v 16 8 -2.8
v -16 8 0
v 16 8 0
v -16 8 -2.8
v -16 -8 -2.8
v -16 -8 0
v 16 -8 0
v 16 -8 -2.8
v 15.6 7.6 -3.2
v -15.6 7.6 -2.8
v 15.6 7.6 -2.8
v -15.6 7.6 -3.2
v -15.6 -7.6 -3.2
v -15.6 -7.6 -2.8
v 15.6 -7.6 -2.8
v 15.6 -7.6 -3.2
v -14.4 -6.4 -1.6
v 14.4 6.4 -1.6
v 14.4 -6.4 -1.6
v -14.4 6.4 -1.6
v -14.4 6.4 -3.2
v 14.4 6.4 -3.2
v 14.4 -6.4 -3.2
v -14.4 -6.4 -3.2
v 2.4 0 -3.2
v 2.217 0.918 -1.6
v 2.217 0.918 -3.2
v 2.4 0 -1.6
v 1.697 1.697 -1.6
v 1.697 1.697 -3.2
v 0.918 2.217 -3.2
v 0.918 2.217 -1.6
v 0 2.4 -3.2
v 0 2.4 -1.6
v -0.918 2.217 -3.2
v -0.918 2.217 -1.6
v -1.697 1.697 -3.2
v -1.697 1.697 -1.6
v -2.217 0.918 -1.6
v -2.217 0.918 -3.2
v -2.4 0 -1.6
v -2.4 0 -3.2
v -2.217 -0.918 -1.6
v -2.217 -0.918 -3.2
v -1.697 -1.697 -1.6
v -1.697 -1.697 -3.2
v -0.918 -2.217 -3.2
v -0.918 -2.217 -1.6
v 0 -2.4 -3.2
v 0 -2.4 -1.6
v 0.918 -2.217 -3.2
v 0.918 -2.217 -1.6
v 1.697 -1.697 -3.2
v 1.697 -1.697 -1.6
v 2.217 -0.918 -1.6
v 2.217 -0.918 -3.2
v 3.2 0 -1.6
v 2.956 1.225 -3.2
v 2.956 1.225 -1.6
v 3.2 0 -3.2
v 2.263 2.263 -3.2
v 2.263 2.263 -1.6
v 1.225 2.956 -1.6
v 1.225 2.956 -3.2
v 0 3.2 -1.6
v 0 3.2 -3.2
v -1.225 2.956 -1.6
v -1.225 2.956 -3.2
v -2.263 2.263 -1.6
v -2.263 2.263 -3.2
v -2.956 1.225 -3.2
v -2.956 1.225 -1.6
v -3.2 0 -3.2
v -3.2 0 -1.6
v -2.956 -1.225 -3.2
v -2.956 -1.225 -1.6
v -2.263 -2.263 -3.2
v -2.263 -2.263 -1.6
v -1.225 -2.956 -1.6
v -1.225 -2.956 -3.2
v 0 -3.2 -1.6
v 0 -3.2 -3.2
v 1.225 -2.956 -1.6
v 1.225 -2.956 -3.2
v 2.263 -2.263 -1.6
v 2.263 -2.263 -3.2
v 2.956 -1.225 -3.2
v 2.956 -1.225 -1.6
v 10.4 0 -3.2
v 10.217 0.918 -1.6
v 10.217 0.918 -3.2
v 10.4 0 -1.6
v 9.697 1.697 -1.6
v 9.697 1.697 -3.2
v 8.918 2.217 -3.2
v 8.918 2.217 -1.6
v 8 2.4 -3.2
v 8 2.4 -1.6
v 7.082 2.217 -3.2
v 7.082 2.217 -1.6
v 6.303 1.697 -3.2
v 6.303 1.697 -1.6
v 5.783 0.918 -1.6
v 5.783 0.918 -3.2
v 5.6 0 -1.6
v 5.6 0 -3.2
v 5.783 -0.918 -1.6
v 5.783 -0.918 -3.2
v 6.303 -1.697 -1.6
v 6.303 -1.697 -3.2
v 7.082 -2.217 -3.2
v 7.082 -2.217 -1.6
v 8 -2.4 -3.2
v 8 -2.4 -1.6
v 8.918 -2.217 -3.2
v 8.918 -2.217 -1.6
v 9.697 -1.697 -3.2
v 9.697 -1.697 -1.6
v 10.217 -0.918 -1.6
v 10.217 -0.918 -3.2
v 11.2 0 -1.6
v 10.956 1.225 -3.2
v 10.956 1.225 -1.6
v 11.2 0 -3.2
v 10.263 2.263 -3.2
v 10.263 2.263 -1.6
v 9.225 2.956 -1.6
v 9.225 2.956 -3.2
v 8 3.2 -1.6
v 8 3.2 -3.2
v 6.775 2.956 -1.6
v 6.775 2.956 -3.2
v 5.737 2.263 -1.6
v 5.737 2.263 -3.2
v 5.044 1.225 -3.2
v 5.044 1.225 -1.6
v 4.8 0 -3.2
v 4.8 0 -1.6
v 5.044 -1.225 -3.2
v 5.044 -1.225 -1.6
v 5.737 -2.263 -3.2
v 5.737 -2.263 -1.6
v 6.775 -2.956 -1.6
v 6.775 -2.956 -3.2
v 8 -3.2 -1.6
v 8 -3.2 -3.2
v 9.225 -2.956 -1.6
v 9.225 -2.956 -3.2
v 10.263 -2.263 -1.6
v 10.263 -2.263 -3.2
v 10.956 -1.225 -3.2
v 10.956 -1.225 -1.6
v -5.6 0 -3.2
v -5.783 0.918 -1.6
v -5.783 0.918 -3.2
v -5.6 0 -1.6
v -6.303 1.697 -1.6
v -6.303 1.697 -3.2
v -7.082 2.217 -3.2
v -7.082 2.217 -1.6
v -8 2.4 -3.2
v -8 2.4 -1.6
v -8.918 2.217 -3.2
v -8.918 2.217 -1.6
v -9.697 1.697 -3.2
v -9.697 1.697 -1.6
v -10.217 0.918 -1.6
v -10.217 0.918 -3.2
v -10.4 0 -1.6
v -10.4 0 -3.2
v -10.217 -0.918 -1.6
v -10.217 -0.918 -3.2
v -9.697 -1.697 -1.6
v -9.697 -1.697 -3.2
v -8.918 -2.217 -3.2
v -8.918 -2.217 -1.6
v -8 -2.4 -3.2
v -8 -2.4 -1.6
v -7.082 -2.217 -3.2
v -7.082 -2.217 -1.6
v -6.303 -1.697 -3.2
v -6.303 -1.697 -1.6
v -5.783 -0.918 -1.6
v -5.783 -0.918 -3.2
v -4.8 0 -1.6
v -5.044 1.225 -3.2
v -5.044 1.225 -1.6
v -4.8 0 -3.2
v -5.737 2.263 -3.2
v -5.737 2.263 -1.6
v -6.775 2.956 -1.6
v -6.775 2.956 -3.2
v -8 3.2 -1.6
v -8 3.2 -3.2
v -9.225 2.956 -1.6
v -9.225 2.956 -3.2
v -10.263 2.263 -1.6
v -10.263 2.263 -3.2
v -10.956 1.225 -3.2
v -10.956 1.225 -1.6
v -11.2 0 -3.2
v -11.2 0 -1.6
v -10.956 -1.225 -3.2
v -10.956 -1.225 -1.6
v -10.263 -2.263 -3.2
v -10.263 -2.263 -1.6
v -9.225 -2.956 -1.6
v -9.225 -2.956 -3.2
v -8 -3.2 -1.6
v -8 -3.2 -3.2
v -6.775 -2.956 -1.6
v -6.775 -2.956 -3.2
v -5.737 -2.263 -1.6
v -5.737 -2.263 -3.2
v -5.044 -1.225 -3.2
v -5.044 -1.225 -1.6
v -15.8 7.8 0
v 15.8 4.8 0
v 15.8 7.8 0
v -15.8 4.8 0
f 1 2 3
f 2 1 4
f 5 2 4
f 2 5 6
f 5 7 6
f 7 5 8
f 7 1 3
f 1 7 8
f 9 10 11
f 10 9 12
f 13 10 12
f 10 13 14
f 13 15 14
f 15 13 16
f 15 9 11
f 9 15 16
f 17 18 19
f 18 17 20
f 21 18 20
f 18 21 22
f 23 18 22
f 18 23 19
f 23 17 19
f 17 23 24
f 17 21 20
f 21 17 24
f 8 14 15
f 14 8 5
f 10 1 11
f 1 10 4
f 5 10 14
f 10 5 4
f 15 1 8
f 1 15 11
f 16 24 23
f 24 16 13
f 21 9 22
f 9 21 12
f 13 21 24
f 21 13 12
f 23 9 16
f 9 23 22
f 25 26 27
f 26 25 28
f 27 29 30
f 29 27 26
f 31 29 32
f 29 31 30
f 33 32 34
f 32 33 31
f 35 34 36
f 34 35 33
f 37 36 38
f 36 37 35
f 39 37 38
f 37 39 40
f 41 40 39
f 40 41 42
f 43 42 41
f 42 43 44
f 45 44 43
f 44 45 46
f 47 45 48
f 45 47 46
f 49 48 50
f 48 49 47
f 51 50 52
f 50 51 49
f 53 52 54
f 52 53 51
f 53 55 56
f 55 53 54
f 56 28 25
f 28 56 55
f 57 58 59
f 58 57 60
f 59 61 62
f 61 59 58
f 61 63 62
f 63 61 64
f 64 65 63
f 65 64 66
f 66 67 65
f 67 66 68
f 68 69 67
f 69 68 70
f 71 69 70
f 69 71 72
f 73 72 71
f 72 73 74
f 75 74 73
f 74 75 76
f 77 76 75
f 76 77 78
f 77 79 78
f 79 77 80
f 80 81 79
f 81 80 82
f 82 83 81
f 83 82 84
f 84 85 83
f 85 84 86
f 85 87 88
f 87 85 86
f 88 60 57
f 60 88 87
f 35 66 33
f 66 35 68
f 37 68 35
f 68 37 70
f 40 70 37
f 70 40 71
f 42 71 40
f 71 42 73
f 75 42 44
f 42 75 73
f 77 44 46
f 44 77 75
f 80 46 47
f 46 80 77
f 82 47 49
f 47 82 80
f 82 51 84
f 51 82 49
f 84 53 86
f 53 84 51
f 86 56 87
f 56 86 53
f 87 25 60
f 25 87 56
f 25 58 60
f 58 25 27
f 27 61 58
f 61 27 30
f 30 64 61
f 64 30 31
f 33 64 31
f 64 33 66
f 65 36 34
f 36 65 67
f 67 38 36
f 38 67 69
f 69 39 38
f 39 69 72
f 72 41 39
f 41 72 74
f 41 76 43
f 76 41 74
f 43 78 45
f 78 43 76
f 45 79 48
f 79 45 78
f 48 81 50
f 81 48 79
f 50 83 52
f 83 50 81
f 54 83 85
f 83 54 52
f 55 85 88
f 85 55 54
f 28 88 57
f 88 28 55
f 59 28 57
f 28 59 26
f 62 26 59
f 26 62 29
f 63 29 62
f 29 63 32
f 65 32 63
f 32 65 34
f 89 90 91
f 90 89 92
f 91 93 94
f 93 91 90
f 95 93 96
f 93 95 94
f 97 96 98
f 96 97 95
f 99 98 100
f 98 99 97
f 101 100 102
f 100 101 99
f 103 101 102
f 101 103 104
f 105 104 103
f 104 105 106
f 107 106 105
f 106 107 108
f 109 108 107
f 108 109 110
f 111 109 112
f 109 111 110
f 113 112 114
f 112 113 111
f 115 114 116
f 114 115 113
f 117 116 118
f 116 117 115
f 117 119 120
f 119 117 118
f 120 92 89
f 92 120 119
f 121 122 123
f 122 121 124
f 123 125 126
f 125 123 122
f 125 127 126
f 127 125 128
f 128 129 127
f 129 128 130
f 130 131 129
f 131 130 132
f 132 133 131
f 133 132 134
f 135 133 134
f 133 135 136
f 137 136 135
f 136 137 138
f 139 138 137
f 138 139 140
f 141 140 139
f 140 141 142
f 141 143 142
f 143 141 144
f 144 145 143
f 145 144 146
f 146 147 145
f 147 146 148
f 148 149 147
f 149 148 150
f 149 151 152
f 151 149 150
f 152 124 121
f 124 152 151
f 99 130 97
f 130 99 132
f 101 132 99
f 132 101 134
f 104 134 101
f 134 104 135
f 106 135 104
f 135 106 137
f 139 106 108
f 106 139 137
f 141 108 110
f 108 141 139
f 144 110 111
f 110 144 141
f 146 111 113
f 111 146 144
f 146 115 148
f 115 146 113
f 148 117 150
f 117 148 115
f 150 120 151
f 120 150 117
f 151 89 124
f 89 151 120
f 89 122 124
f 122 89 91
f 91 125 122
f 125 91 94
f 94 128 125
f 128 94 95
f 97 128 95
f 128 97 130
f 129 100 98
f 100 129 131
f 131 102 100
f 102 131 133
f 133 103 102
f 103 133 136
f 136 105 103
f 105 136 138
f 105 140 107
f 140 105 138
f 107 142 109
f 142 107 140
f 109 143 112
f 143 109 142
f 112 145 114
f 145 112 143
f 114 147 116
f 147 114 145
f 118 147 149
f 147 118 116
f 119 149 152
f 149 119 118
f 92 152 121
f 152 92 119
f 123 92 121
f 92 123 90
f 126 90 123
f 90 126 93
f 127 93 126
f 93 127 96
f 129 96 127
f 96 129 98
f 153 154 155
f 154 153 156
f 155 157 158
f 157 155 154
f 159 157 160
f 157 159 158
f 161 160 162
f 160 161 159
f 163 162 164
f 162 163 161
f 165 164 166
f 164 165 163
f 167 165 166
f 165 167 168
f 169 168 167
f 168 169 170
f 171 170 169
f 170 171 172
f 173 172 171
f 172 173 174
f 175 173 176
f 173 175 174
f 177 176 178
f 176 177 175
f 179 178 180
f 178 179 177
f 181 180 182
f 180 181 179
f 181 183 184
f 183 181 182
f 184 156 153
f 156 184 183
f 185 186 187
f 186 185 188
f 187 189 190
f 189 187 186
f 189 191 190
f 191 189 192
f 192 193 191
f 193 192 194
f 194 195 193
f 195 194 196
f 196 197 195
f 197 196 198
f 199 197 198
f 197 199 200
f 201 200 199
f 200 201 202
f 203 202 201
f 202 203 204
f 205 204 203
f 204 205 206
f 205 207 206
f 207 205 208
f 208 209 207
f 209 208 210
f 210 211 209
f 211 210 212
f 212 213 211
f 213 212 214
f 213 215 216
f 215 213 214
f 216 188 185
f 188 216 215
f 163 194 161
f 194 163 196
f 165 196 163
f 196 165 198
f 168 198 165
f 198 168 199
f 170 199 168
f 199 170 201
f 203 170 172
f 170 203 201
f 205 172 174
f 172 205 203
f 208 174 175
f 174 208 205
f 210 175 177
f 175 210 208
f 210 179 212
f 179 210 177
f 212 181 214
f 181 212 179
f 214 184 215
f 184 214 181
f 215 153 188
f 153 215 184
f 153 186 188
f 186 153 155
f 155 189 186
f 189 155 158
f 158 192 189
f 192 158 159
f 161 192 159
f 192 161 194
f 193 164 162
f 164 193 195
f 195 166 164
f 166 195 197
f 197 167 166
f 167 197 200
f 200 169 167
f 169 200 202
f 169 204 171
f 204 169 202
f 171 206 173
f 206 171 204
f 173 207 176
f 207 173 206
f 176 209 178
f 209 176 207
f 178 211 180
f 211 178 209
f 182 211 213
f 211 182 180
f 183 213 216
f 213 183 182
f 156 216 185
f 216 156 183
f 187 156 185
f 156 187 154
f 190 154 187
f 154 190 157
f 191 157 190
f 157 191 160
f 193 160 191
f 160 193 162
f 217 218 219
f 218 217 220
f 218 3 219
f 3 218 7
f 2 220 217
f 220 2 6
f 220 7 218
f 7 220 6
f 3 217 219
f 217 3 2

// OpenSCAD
// file: ../p/4-4ring3.scad
use <../lib.scad>
$fa=1; $fs=0.2;
function ldraw_lib__4_4ring3(realsolid=false) = [
// 0 Ring  3 x 1.0
// 0 Name: 4-4ring3.dat
// 0 Author: James Jessiman
// 0 !LDRAW_ORG Primitive UPDATE 2009-01
// 0 !LICENSE Licensed under CC BY 2.0 and CC BY 4.0 : see CAreadme.txt
// 
// 0 BFC CERTIFY CCW
  [0,"BFC","CERTIFY"],
  [0,"BFC","CCW"],
// 
// 0 !HISTORY 1998-12-15 [PTadmin] Official Update 1998-10
// 0 !HISTORY 2002-04-05 [hafhead] Added BFC statement
// 0 !HISTORY 2002-04-25 [PTadmin] Official Update 2002-02
// 0 !HISTORY 2007-06-24 [PTadmin] Header formatted for Contributor Agreement
// 0 !HISTORY 2008-07-01 [PTadmin] Official Update 2008-01
// 0 !HISTORY 2008-08-26 [cwdee] Switch polygon winding and rename
// 0 !HISTORY 2009-05-02 [PTadmin] Official Update 2009-01
// 
// 
// 4 16 -1.5308 0 3.6956 -1.1481 0 2.7717 0 0 3 0 0 4
  [4,16,-1.5308,0,3.6956,-1.1481,0,2.7717,0,0,3,0,0,4],
// 4 16 -2.8284 0 2.8284 -2.1213 0 2.1213 -1.1481 0 2.7717 -1.5308 0 3.6956
  [4,16,-2.8284,0,2.8284,-2.1213,0,2.1213,-1.1481,0,2.7717,-1.5308,0,3.6956],
// 4 16 -3.6956 0 1.5308 -2.7717 0 1.1481 -2.1213 0 2.1213 -2.8284 0 2.8284
  [4,16,-3.6956,0,1.5308,-2.7717,0,1.1481,-2.1213,0,2.1213,-2.8284,0,2.8284],
// 4 16 -4 0 0 -3 0 0 -2.7717 0 1.1481 -3.6956 0 1.5308
  [4,16,-4,0,0,-3,0,0,-2.7717,0,1.1481,-3.6956,0,1.5308],
// 4 16 -3.6956 0 -1.5308 -2.7717 0 -1.1481 -3 0 0 -4 0 0
  [4,16,-3.6956,0,-1.5308,-2.7717,0,-1.1481,-3,0,0,-4,0,0],
// 4 16 -2.8284 0 -2.8284 -2.1213 0 -2.1213 -2.7717 0 -1.1481 -3.6956 0 -1.5308
  [4,16,-2.8284,0,-2.8284,-2.1213,0,-2.1213,-2.7717,0,-1.1481,-3.6956,0,-1.5308],
// 4 16 -1.5308 0 -3.6956 -1.1481 0 -2.7717 -2.1213 0 -2.1213 -2.8284 0 -2.8284
  [4,16,-1.5308,0,-3.6956,-1.1481,0,-2.7717,-2.1213,0,-2.1213,-2.8284,0,-2.8284],
// 4 16 0 0 -4 0 0 -3 -1.1481 0 -2.7717 -1.5308 0 -3.6956
  [4,16,0,0,-4,0,0,-3,-1.1481,0,-2.7717,-1.5308,0,-3.6956],
// 4 16 1.5308 0 -3.6956 1.1481 0 -2.7717 0 0 -3 0 0 -4
  [4,16,1.5308,0,-3.6956,1.1481,0,-2.7717,0,0,-3,0,0,-4],
// 4 16 2.8284 0 -2.8284 2.1213 0 -2.1213 1.1481 0 -2.7717 1.5308 0 -3.6956
  [4,16,2.8284,0,-2.8284,2.1213,0,-2.1213,1.1481,0,-2.7717,1.5308,0,-3.6956],
// 4 16 3.6956 0 -1.5308 2.7717 0 -1.1481 2.1213 0 -2.1213 2.8284 0 -2.8284
  [4,16,3.6956,0,-1.5308,2.7717,0,-1.1481,2.1213,0,-2.1213,2.8284,0,-2.8284],
// 4 16 4 0 0 3 0 0 2.7717 0 -1.1481 3.6956 0 -1.5308
  [4,16,4,0,0,3,0,0,2.7717,0,-1.1481,3.6956,0,-1.5308],
// 4 16 3.6956 0 1.5308 2.7717 0 1.1481 3 0 0 4 0 0
  [4,16,3.6956,0,1.5308,2.7717,0,1.1481,3,0,0,4,0,0],
// 4 16 2.8284 0 2.8284 2.1213 0 2.1213 2.7717 0 1.1481 3.6956 0 1.5308
  [4,16,2.8284,0,2.8284,2.1213,0,2.1213,2.7717,0,1.1481,3.6956,0,1.5308],
// 4 16 1.5308 0 3.6956 1.1481 0 2.7717 2.1213 0 2.1213 2.8284 0 2.8284
  [4,16,1.5308,0,3.6956,1.1481,0,2.7717,2.1213,0,2.1213,2.8284,0,2.8284],
// 4 16 0 0 4 0 0 3 1.1481 0 2.7717 1.5308 0 3.6956
  [4,16,0,0,4,0,0,3,1.1481,0,2.7717,1.5308,0,3.6956],
// 0
];
module ldraw_lib__4_4ring3(step=0, col=false, unit=2/5, alt=false, line=0.2, solid=!$preview)
    makepoly(ldraw_lib__4_4ring3(solid), step=step, col=col, unit=unit, alt=alt, line=line, solid=solid);
ldraw_lib__4_4ring3(line=0.2);
// file: ../p/4-4edge.scad
use <../lib.scad>
function ldraw_lib__4_4edge() = [
// 0 Circle 1.0
// 0 Name: 4-4edge.dat
// 0 Author: James Jessiman
// 0 !LDRAW_ORG Primitive UPDATE 2017-01
// 0 !LICENSE Licensed under CC BY 2.0 and CC BY 4.0 : see CAreadme.txt
// 
// 0 BFC CERTIFY CCW
  [0,"BFC","CERTIFY"],
  [0,"BFC","CCW"],
// 
// 0 !HISTORY 1998-12-15 [PTadmin] Official Update 1998-10
// 0 !HISTORY 2005-12-28 [PTadmin] Official Update 2005-01
// 0 !HISTORY 2007-06-24 [PTadmin] Header formatted for Contributor Agreement
// 0 !HISTORY 2008-07-01 [PTadmin] Official Update 2008-01
// 0 !HISTORY 2017-01-15 [Steffen] BFCed
// 0 !HISTORY 2017-12-30 [PTadmin] Official Update 2017-01
// 
// 
// 2 24 1 0 0 0.9239 0 0.3827
  [2,24,1,0,0,0.9239,0,0.3827],
// 2 24 0.9239 0 0.3827 0.7071 0 0.7071
  [2,24,0.9239,0,0.3827,0.7071,0,0.7071],
// 2 24 0.7071 0 0.7071 0.3827 0 0.9239
  [2,24,0.7071,0,0.7071,0.3827,0,0.9239],
// 2 24 0.3827 0 0.9239 0 0 1
  [2,24,0.3827,0,0.9239,0,0,1],
// 2 24 0 0 1 -0.3827 0 0.9239
  [2,24,0,0,1,-0.3827,0,0.9239],
// 2 24 -0.3827 0 0.9239 -0.7071 0 0.7071
  [2,24,-0.3827,0,0.9239,-0.7071,0,0.7071],
// 2 24 -0.7071 0 0.7071 -0.9239 0 0.3827
  [2,24,-0.7071,0,0.7071,-0.9239,0,0.3827],
// 2 24 -0.9239 0 0.3827 -1 0 -0
  [2,24,-0.9239,0,0.3827,-1,0,-0],
// 2 24 -1 0 -0 -0.9239 0 -0.3827
  [2,24,-1,0,-0,-0.9239,0,-0.3827],
// 2 24 -0.9239 0 -0.3827 -0.7071 0 -0.7071
  [2,24,-0.9239,0,-0.3827,-0.7071,0,-0.7071],
// 2 24 -0.7071 0 -0.7071 -0.3827 0 -0.9239
  [2,24,-0.7071,0,-0.7071,-0.3827,0,-0.9239],
// 2 24 -0.3827 0 -0.9239 0 0 -1
  [2,24,-0.3827,0,-0.9239,0,0,-1],
// 2 24 0 0 -1 0.3827 0 -0.9239
  [2,24,0,0,-1,0.3827,0,-0.9239],
// 2 24 0.3827 0 -0.9239 0.7071 0 -0.7071
  [2,24,0.3827,0,-0.9239,0.7071,0,-0.7071],
// 2 24 0.7071 0 -0.7071 0.9239 0 -0.3827
  [2,24,0.7071,0,-0.7071,0.9239,0,-0.3827],
// 2 24 0.9239 0 -0.3827 1 0 0
  [2,24,0.9239,0,-0.3827,1,0,0],
];
module ldraw_lib__4_4edge(step=0, col=false, unit=2/5, alt=false, line=0.2, solid=!$preview)
    makepoly(ldraw_lib__4_4edge(), step=step, col=col, unit=unit, alt=alt, line=line, solid=solid);
ldraw_lib__4_4edge(line=0.2);
// file: ../p/4-4cyli.scad
use <../lib.scad>
$fa=1; $fs=0.2;
function ldraw_lib__4_4cyli(realsolid=false) = [
// 0 Cylinder 1.0
// 0 Name: 4-4cyli.dat
// 0 Author: James Jessiman
// 0 !LDRAW_ORG Primitive UPDATE 2005-01
// 0 !LICENSE Licensed under CC BY 2.0 and CC BY 4.0 : see CAreadme.txt
// 
// 0 BFC CERTIFY CCW
  [0,"BFC","CERTIFY"],
  [0,"BFC","CCW"],
// 
// 0 !HISTORY 1998-12-15 [PTadmin] Official Update 1998-10
// 0 !HISTORY 2002-03-23 [sbliss] Added BFC statement; merged headers from files in distributions LDraw 0.27 and Complete.
// 0 !HISTORY 2002-04-25 [PTadmin] Official Update 2002-02
// 0 !HISTORY 2004-12-14 [guyvivan] BFC CCW
// 0 !HISTORY 2005-12-28 [PTadmin] Official Update 2005-01
// 0 !HISTORY 2007-06-24 [PTadmin] Header formatted for Contributor Agreement
// 0 !HISTORY 2008-07-01 [PTadmin] Official Update 2008-01
// 
// 
// 4 16 1 1 0 0.9239 1 0.3827 0.9239 0 0.3827 1 0 0
  [4,16,1,1,0,0.9239,1,0.3827,0.9239,0,0.3827,1,0,0],
// 5 24 1 0 0 1 1 0 0.9239 0 0.3827 0.9239 0 -0.3827
  [5,24,1,0,0,1,1,0,0.9239,0,0.3827,0.9239,0,-0.3827],
// 4 16 0.9239 1 0.3827 0.7071 1 0.7071 0.7071 0 0.7071 0.9239 0 0.3827
  [4,16,0.9239,1,0.3827,0.7071,1,0.7071,0.7071,0,0.7071,0.9239,0,0.3827],
// 5 24 0.9239 0 0.3827 0.9239 1 0.3827 0.7071 0 0.7071 1 0 0
  [5,24,0.9239,0,0.3827,0.9239,1,0.3827,0.7071,0,0.7071,1,0,0],
// 4 16 0.7071 1 0.7071 0.3827 1 0.9239 0.3827 0 0.9239 0.7071 0 0.7071
  [4,16,0.7071,1,0.7071,0.3827,1,0.9239,0.3827,0,0.9239,0.7071,0,0.7071],
// 5 24 0.7071 0 0.7071 0.7071 1 0.7071 0.3827 0 0.9239 0.9239 0 0.3827
  [5,24,0.7071,0,0.7071,0.7071,1,0.7071,0.3827,0,0.9239,0.9239,0,0.3827],
// 4 16 0.3827 1 0.9239 0 1 1 0 0 1 0.3827 0 0.9239
  [4,16,0.3827,1,0.9239,0,1,1,0,0,1,0.3827,0,0.9239],
// 5 24 0.3827 0 0.9239 0.3827 1 0.9239 0 0 1 0.7071 0 0.7071
  [5,24,0.3827,0,0.9239,0.3827,1,0.9239,0,0,1,0.7071,0,0.7071],
// 4 16 0 1 1 -0.3827 1 0.9239 -0.3827 0 0.9239 0 0 1
  [4,16,0,1,1,-0.3827,1,0.9239,-0.3827,0,0.9239,0,0,1],
// 5 24 0 0 1 0 1 1 -0.3827 0 0.9239 0.3827 0 0.9239
  [5,24,0,0,1,0,1,1,-0.3827,0,0.9239,0.3827,0,0.9239],
// 4 16 -0.3827 1 0.9239 -0.7071 1 0.7071 -0.7071 0 0.7071 -0.3827 0 0.9239
  [4,16,-0.3827,1,0.9239,-0.7071,1,0.7071,-0.7071,0,0.7071,-0.3827,0,0.9239],
// 5 24 -0.3827 0 0.9239 -0.3827 1 0.9239 -0.7071 0 0.7071 0 0 1
  [5,24,-0.3827,0,0.9239,-0.3827,1,0.9239,-0.7071,0,0.7071,0,0,1],
// 4 16 -0.7071 1 0.7071 -0.9239 1 0.3827 -0.9239 0 0.3827 -0.7071 0 0.7071
  [4,16,-0.7071,1,0.7071,-0.9239,1,0.3827,-0.9239,0,0.3827,-0.7071,0,0.7071],
// 5 24 -0.7071 0 0.7071 -0.7071 1 0.7071 -0.9239 0 0.3827 -0.3827 0 0.9239
  [5,24,-0.7071,0,0.7071,-0.7071,1,0.7071,-0.9239,0,0.3827,-0.3827,0,0.9239],
// 4 16 -0.9239 1 0.3827 -1 1 0 -1 0 0 -0.9239 0 0.3827
  [4,16,-0.9239,1,0.3827,-1,1,0,-1,0,0,-0.9239,0,0.3827],
// 5 24 -0.9239 0 0.3827 -0.9239 1 0.3827 -1 0 0 -0.7071 0 0.7071
  [5,24,-0.9239,0,0.3827,-0.9239,1,0.3827,-1,0,0,-0.7071,0,0.7071],
// 4 16 -1 1 0 -0.9239 1 -0.3827 -0.9239 0 -0.3827 -1 0 0
  [4,16,-1,1,0,-0.9239,1,-0.3827,-0.9239,0,-0.3827,-1,0,0],
// 5 24 -1 0 0 -1 1 0 -0.9239 0 -0.3827 -0.9239 0 0.3827
  [5,24,-1,0,0,-1,1,0,-0.9239,0,-0.3827,-0.9239,0,0.3827],
// 4 16 -0.9239 1 -0.3827 -0.7071 1 -0.7071 -0.7071 0 -0.7071 -0.9239 0 -0.3827
  [4,16,-0.9239,1,-0.3827,-0.7071,1,-0.7071,-0.7071,0,-0.7071,-0.9239,0,-0.3827],
// 5 24 -0.9239 0 -0.3827 -0.9239 1 -0.3827 -0.7071 0 -0.7071 -1 0 0
  [5,24,-0.9239,0,-0.3827,-0.9239,1,-0.3827,-0.7071,0,-0.7071,-1,0,0],
// 4 16 -0.7071 1 -0.7071 -0.3827 1 -0.9239 -0.3827 0 -0.9239 -0.7071 0 -0.7071
  [4,16,-0.7071,1,-0.7071,-0.3827,1,-0.9239,-0.3827,0,-0.9239,-0.7071,0,-0.7071],
// 5 24 -0.7071 0 -0.7071 -0.7071 1 -0.7071 -0.3827 0 -0.9239 -0.9239 0 -0.3827
  [5,24,-0.7071,0,-0.7071,-0.7071,1,-0.7071,-0.3827,0,-0.9239,-0.9239,0,-0.3827],
// 4 16 -0.3827 1 -0.9239 0 1 -1 0 0 -1 -0.3827 0 -0.9239
  [4,16,-0.3827,1,-0.9239,0,1,-1,0,0,-1,-0.3827,0,-0.9239],
// 5 24 -0.3827 0 -0.9239 -0.3827 1 -0.9239 0 0 -1 -0.7071 0 -0.7071
  [5,24,-0.3827,0,-0.9239,-0.3827,1,-0.9239,0,0,-1,-0.7071,0,-0.7071],
// 4 16 0 1 -1 0.3827 1 -0.9239 0.3827 0 -0.9239 0 0 -1
  [4,16,0,1,-1,0.3827,1,-0.9239,0.3827,0,-0.9239,0,0,-1],
// 5 24 0 0 -1 0 1 -1 0.3827 0 -0.9239 -0.3827 0 -0.9239
  [5,24,0,0,-1,0,1,-1,0.3827,0,-0.9239,-0.3827,0,-0.9239],
// 4 16 0.3827 1 -0.9239 0.7071 1 -0.7071 0.7071 0 -0.7071 0.3827 0 -0.9239
  [4,16,0.3827,1,-0.9239,0.7071,1,-0.7071,0.7071,0,-0.7071,0.3827,0,-0.9239],
// 5 24 0.3827 0 -0.9239 0.3827 1 -0.9239 0.7071 0 -0.7071 0 0 -1
  [5,24,0.3827,0,-0.9239,0.3827,1,-0.9239,0.7071,0,-0.7071,0,0,-1],
// 4 16 0.7071 1 -0.7071 0.9239 1 -0.3827 0.9239 0 -0.3827 0.7071 0 -0.7071
  [4,16,0.7071,1,-0.7071,0.9239,1,-0.3827,0.9239,0,-0.3827,0.7071,0,-0.7071],
// 5 24 0.7071 0 -0.7071 0.7071 1 -0.7071 0.9239 0 -0.3827 0.3827 0 -0.9239
  [5,24,0.7071,0,-0.7071,0.7071,1,-0.7071,0.9239,0,-0.3827,0.3827,0,-0.9239],
// 4 16 0.9239 1 -0.3827 1 1 0 1 0 0 0.9239 0 -0.3827
  [4,16,0.9239,1,-0.3827,1,1,0,1,0,0,0.9239,0,-0.3827],
// 5 24 0.9239 0 -0.3827 0.9239 1 -0.3827 1 0 0 0.7071 0 -0.7071
  [5,24,0.9239,0,-0.3827,0.9239,1,-0.3827,1,0,0,0.7071,0,-0.7071],
// 0
];
module ldraw_lib__4_4cyli(step=0, col=false, unit=2/5, alt=false, line=0.2, solid=!$preview)
    makepoly(ldraw_lib__4_4cyli(solid), step=step, col=col, unit=unit, alt=alt, line=line, solid=solid);
ldraw_lib__4_4cyli(line=0.2);
// file: ../p/stud4.scad
use <../lib.scad>
use <4-4cyli.scad>
use <4-4edge.scad>
use <4-4ring3.scad>
function ldraw_lib__stud4() = [
// 0 Stud Tube Open
// 0 Name: stud4.dat
// 0 Author: James Jessiman
// 0 !LDRAW_ORG Primitive UPDATE 2009-02
// 0 !LICENSE Licensed under CC BY 4.0 : see CAreadme.txt
// 
// 0 BFC CERTIFY CCW
  [0,"BFC","CERTIFY"],
  [0,"BFC","CCW"],
// 
// 0 !HISTORY 1999-07-05 [PTadmin] Official Update 1999-05
// 0 !HISTORY 2002-04-04 [sbliss] Modified for BFC compliance
// 0 !HISTORY 2002-04-25 [PTadmin] Official Update 2002-02
// 0 !HISTORY 2007-06-24 [PTadmin] Header formatted for Contributor Agreement
// 0 !HISTORY 2008-07-01 [PTadmin] Official Update 2008-01
// 0 !HISTORY 2009-06-21 [cwdee] Update ring references to 4-4ring
// 0 !HISTORY 2009-09-03 [PTadmin] Official Update 2009-02
// 
// 
// 1 16 0 -4 0 6 0 0 0 1 0 0 0 6 4-4edge.dat
  [1,16,0,-4,0,6,0,0,0,1,0,0,0,6, ldraw_lib__4_4edge()],
// 1 16 0 -4 0 8 0 0 0 1 0 0 0 8 4-4edge.dat
  [1,16,0,-4,0,8,0,0,0,1,0,0,0,8, ldraw_lib__4_4edge()],
// 1 16 0 0 0 6 0 0 0 1 0 0 0 6 4-4edge.dat
  [1,16,0,0,0,6,0,0,0,1,0,0,0,6, ldraw_lib__4_4edge()],
// 1 16 0 0 0 8 0 0 0 1 0 0 0 8 4-4edge.dat
  [1,16,0,0,0,8,0,0,0,1,0,0,0,8, ldraw_lib__4_4edge()],
// 0 BFC INVERTNEXT
  [0,"BFC","INVERTNEXT"],
// 1 16 0 -4 0 6 0 0 0 4 0 0 0 6 4-4cyli.dat
  [1,16,0,-4,0,6,0,0,0,4,0,0,0,6, ldraw_lib__4_4cyli()],
// 1 16 0 -4 0 8 0 0 0 4 0 0 0 8 4-4cyli.dat
  [1,16,0,-4,0,8,0,0,0,4,0,0,0,8, ldraw_lib__4_4cyli()],
// 1 16 0 -4 0 2 0 0 0 1 0 0 0 2 4-4ring3.dat
  [1,16,0,-4,0,2,0,0,0,1,0,0,0,2, ldraw_lib__4_4ring3()],
  [-1,16,0,0,0,2,0,0,0,-1,0,0,0,2, ldraw_lib__4_4ring3()],
// 0
];
module ldraw_lib__stud4(step=0, col=false, unit=2/5, alt=false, line=0.2, solid=!$preview)
    makepoly(ldraw_lib__stud4(), step=step, col=col, unit=unit, alt=alt, line=line, solid=solid);
ldraw_lib__stud4(line=0.2);
// file: ../p/box5.scad
use <../lib.scad>
function ldraw_lib__box5() = [
// 0 Box with 5 Faces and All Edges
// 0 Name: box5.dat
// 0 Author: James Jessiman
// 0 !LDRAW_ORG Primitive UPDATE 2012-01
// 0 !LICENSE Licensed under CC BY 2.0 and CC BY 4.0 : see CAreadme.txt
// 
// 0 BFC CERTIFY CCW
  [0,"BFC","CERTIFY"],
  [0,"BFC","CCW"],
// 
// 0 !HISTORY 2002-04-03 [sbliss] Modified for BFC compliance
// 0 !HISTORY 2002-04-25 [PTadmin] Official Update 2002-02
// 0 !HISTORY 2007-06-24 [PTadmin] Header formatted for Contributor Agreement
// 0 !HISTORY 2008-07-01 [PTadmin] Official Update 2008-01
// 0 !HISTORY 2012-02-16 [Philo] Changed to CCW
// 0 !HISTORY 2012-03-30 [PTadmin] Official Update 2012-01
// 
// 
// 2 24 1 1 1 -1 1 1
  [2,24,1,1,1,-1,1,1],
// 2 24 -1 1 1 -1 1 -1
  [2,24,-1,1,1,-1,1,-1],
// 2 24 -1 1 -1 1 1 -1
  [2,24,-1,1,-1,1,1,-1],
// 2 24 1 1 -1 1 1 1
  [2,24,1,1,-1,1,1,1],
// 2 24 1 0 1 -1 0 1
  [2,24,1,0,1,-1,0,1],
// 2 24 -1 0 1 -1 0 -1
  [2,24,-1,0,1,-1,0,-1],
// 2 24 -1 0 -1 1 0 -1
  [2,24,-1,0,-1,1,0,-1],
// 2 24 1 0 -1 1 0 1
  [2,24,1,0,-1,1,0,1],
// 2 24 1 0 1 1 1 1
  [2,24,1,0,1,1,1,1],
// 2 24 -1 0 1 -1 1 1
  [2,24,-1,0,1,-1,1,1],
// 2 24 1 0 -1 1 1 -1
  [2,24,1,0,-1,1,1,-1],
// 2 24 -1 0 -1 -1 1 -1
  [2,24,-1,0,-1,-1,1,-1],
// 4 16 -1 1 1 1 1 1 1 1 -1 -1 1 -1
  [4,16,-1,1,1,1,1,1,1,1,-1,-1,1,-1],
// 4 16 -1 1 1 -1 0 1 1 0 1 1 1 1
  [4,16,-1,1,1,-1,0,1,1,0,1,1,1,1],
// 4 16 -1 1 -1 -1 0 -1 -1 0 1 -1 1 1
  [4,16,-1,1,-1,-1,0,-1,-1,0,1,-1,1,1],
// 4 16 1 1 -1 1 0 -1 -1 0 -1 -1 1 -1
  [4,16,1,1,-1,1,0,-1,-1,0,-1,-1,1,-1],
// 4 16 1 1 1 1 0 1 1 0 -1 1 1 -1
  [4,16,1,1,1,1,0,1,1,0,-1,1,1,-1],
];
makepoly(ldraw_lib__box5(), line=0.2);
// file: ../p/box4.scad
use <../lib.scad>
function ldraw_lib__box4() = [
// 0 Box with 4 Faces (2 Parallel Pairs) and All Edges
// 0 Name: box4.dat
// 0 Author: James Jessiman
// 0 !LDRAW_ORG Primitive UPDATE 2012-01
// 0 !LICENSE Licensed under CC BY 4.0 : see CAreadme.txt
// 
// 0 BFC CERTIFY CCW
  [0,"BFC","CERTIFY"],
  [0,"BFC","CCW"],
// 
// 0 !HISTORY 2002-04-03 [sbliss] Modified for BFC compliance
// 0 !HISTORY 2002-04-25 [PTadmin] Official Update 2002-02
// 0 !HISTORY 2007-06-24 [PTadmin] Header formatted for Contributor Agreement
// 0 !HISTORY 2008-07-01 [PTadmin] Official Update 2008-01
// 0 !HISTORY 2012-02-16 [Philo] Changed to CCW
// 0 !HISTORY 2012-03-30 [PTadmin] Official Update 2012-01
// 
// 
// 2 24 1 1 1 -1 1 1
  [2,24,1,1,1,-1,1,1],
// 2 24 -1 1 1 -1 1 -1
  [2,24,-1,1,1,-1,1,-1],
// 2 24 -1 1 -1 1 1 -1
  [2,24,-1,1,-1,1,1,-1],
// 2 24 1 1 -1 1 1 1
  [2,24,1,1,-1,1,1,1],
// 2 24 1 0 1 -1 0 1
  [2,24,1,0,1,-1,0,1],
// 2 24 -1 0 1 -1 0 -1
  [2,24,-1,0,1,-1,0,-1],
// 2 24 -1 0 -1 1 0 -1
  [2,24,-1,0,-1,1,0,-1],
// 2 24 1 0 -1 1 0 1
  [2,24,1,0,-1,1,0,1],
// 2 24 1 0 1 1 1 1
  [2,24,1,0,1,1,1,1],
// 2 24 -1 0 1 -1 1 1
  [2,24,-1,0,1,-1,1,1],
// 2 24 1 0 -1 1 1 -1
  [2,24,1,0,-1,1,1,-1],
// 2 24 -1 0 -1 -1 1 -1
  [2,24,-1,0,-1,-1,1,-1],
// 4 16 -1 1 1 -1 0 1 1 0 1 1 1 1
  [4,16,-1,1,1,-1,0,1,1,0,1,1,1,1],
// 4 16 -1 1 -1 -1 0 -1 -1 0 1 -1 1 1
  [4,16,-1,1,-1,-1,0,-1,-1,0,1,-1,1,1],
// 4 16 1 1 -1 1 0 -1 -1 0 -1 -1 1 -1
  [4,16,1,1,-1,1,0,-1,-1,0,-1,-1,1,-1],
// 4 16 1 1 1 1 0 1 1 0 -1 1 1 -1
  [4,16,1,1,1,1,0,1,1,0,-1,1,1,-1],
];
module ldraw_lib__box4(step=0, col=false, unit=2/5, alt=false, line=0.2, solid=!$preview)
    makepoly(ldraw_lib__box4(), step=step, col=col, unit=unit, alt=alt, line=line, solid=solid);
ldraw_lib__box4(line=0.2);
// file: s/87079s01.scad
use <../../lib.scad>
use <../../p/box4.scad>
use <../../p/box5.scad>
use <../../p/stud4.scad>
function ldraw_lib__s__87079s01() = [
// 0 ~Tile  2 x  4 without Top Surface
// 0 Name: s\87079s01.dat
// 0 Author: Philippe Hurbain [Philo]
// 0 !LDRAW_ORG Subpart UPDATE 2025-04
// 0 !LICENSE Licensed under CC BY 4.0 : see CAreadme.txt
// 
// 0 BFC CERTIFY CCW
  [0,"BFC","CERTIFY"],
  [0,"BFC","CCW"],
// 
// 0 !HISTORY 2012-09-30 [Philo] Subparted from Tim Gould's original design
// 0 !HISTORY 2012-12-28 [PTadmin] Official Update 2012-03
// 0 !HISTORY 2025-04-25 [MagFors] Update description
// 0 !HISTORY 2025-04-27 [OrionP] Official Update 2025-04
// 
// 1 16 0 0 0 40 0 0 0 7 0 0 0 20 box4.dat
  [1,16,0,0,0,40,0,0,0,7,0,0,0,20, ldraw_lib__box4()],
// 1 16 0 7 0 39 0 0 0 1 0 0 0 19 box4.dat
  [1,16,0,7,0,39,0,0,0,1,0,0,0,19, ldraw_lib__box4()],
// 0 BFC INVERTNEXT
  [0,"BFC","INVERTNEXT"],
// 1 16 0 8 0 -36 0 0 0 -4 0 0 0 16 box5.dat
  [1,16,0,8,0,-36,0,0,0,-4,0,0,0,16, ldraw_lib__box5()],
// 4 16 -40 7 -20 -39 7 -19 39 7 -19 40 7 -20
  [4,16,-40,7,-20,-39,7,-19,39,7,-19,40,7,-20],
// 4 16 40 7 20 39 7 19 -39 7 19 -40 7 20
  [4,16,40,7,20,39,7,19,-39,7,19,-40,7,20],
// 4 16 -40 7 -20 -40 7 20 -39 7 19 -39 7 -19
  [4,16,-40,7,-20,-40,7,20,-39,7,19,-39,7,-19],
// 4 16 40 7 20 40 7 -20 39 7 -19 39 7 19
  [4,16,40,7,20,40,7,-20,39,7,-19,39,7,19],
// 4 16 -39 8 -19 -36 8 -16 36 8 -16 39 8 -19
  [4,16,-39,8,-19,-36,8,-16,36,8,-16,39,8,-19],
// 4 16 39 8 19 36 8 16 -36 8 16 -39 8 19
  [4,16,39,8,19,36,8,16,-36,8,16,-39,8,19],
// 4 16 -39 8 -19 -39 8 19 -36 8 16 -36 8 -16
  [4,16,-39,8,-19,-39,8,19,-36,8,16,-36,8,-16],
// 4 16 39 8 19 39 8 -19 36 8 -16 36 8 16
  [4,16,39,8,19,39,8,-19,36,8,-16,36,8,16],
// 1 16 0 4 0 1 0 0 0 -1 0 0 0 1 stud4.dat
  [1,16,0,4,0,1,0,0,0,-1,0,0,0,1, ldraw_lib__stud4()],
// 1 16 20 4 0 1 0 0 0 -1 0 0 0 1 stud4.dat
  [1,16,20,4,0,1,0,0,0,-1,0,0,0,1, ldraw_lib__stud4()],
// 1 16 -20 4 0 1 0 0 0 -1 0 0 0 1 stud4.dat
  [1,16,-20,4,0,1,0,0,0,-1,0,0,0,1, ldraw_lib__stud4()],
];
module ldraw_lib__s__87079s01(step=0, col=false, unit=2/5, alt=false, line=0.2, solid=!$preview)
    makepoly(ldraw_lib__s__87079s01(), step=step, col=col, unit=unit, alt=alt, line=line, solid=solid);
ldraw_lib__s__87079s01(line=0.2);
// main file
use <../lib.scad>
use <s/87079s01.scad>
function ldraw_lib__87079p0i() = [
// 0 Tile  2 x  4 with Red Stripe Pattern
// 0 Name: 87079p0i.dat
// 0 Author: Florent Faramond [Makou]
// 0 !LDRAW_ORG Part UPDATE 2025-04
// 0 !LICENSE Licensed under CC BY 4.0 : see CAreadme.txt
// 
// 0 BFC CERTIFY CCW
  [0,"BFC","CERTIFY"],
  [0,"BFC","CCW"],
// 
// 0 !KEYWORDS Bricklink 87079pb1326, Concorde, Rebrickable 87079pr0317, Set 10318
// 
// 0 !HISTORY 2025-04-15 [Holly-Wood] Rotated pattern
// 0 !HISTORY 2025-04-27 [OrionP] Official Update 2025-04
// 
// 1 16 0 0 0 1 0 0 0 1 0 0 0 1 s\87079s01.dat
  [1,16,0,0,0,1,0,0,0,1,0,0,0,1, ldraw_lib__s__87079s01()],
// 
// 4 4 39.5 0 19.5 -39.5 0 19.5 -39.5 0 12 39.5 0 12
  [4,4,39.5,0,19.5,-39.5,0,19.5,-39.5,0,12,39.5,0,12],
// 4 16 39.5 0 19.5 39.5 0 12 40 0 -20 40 0 20
  [4,16,39.5,0,19.5,39.5,0,12,40,0,-20,40,0,20],
// 4 16 -40 0 -20 -39.5 0 12 -39.5 0 19.5 -40 0 20
  [4,16,-40,0,-20,-39.5,0,12,-39.5,0,19.5,-40,0,20],
// 4 16 40 0 -20 39.5 0 12 -39.5 0 12 -40 0 -20
  [4,16,40,0,-20,39.5,0,12,-39.5,0,12,-40,0,-20],
// 4 16 -39.5 0 19.5 39.5 0 19.5 40 0 20 -40 0 20
  [4,16,-39.5,0,19.5,39.5,0,19.5,40,0,20,-40,0,20],
];
module ldraw_lib__87079p0i(step=0, col=false, unit=2/5, alt=false, line=0.2, solid=!$preview)
    makepoly(ldraw_lib__87079p0i(), step=step, col=col, unit=unit, alt=alt, line=line, solid=solid);
ldraw_lib__87079p0i(line=0.2);
